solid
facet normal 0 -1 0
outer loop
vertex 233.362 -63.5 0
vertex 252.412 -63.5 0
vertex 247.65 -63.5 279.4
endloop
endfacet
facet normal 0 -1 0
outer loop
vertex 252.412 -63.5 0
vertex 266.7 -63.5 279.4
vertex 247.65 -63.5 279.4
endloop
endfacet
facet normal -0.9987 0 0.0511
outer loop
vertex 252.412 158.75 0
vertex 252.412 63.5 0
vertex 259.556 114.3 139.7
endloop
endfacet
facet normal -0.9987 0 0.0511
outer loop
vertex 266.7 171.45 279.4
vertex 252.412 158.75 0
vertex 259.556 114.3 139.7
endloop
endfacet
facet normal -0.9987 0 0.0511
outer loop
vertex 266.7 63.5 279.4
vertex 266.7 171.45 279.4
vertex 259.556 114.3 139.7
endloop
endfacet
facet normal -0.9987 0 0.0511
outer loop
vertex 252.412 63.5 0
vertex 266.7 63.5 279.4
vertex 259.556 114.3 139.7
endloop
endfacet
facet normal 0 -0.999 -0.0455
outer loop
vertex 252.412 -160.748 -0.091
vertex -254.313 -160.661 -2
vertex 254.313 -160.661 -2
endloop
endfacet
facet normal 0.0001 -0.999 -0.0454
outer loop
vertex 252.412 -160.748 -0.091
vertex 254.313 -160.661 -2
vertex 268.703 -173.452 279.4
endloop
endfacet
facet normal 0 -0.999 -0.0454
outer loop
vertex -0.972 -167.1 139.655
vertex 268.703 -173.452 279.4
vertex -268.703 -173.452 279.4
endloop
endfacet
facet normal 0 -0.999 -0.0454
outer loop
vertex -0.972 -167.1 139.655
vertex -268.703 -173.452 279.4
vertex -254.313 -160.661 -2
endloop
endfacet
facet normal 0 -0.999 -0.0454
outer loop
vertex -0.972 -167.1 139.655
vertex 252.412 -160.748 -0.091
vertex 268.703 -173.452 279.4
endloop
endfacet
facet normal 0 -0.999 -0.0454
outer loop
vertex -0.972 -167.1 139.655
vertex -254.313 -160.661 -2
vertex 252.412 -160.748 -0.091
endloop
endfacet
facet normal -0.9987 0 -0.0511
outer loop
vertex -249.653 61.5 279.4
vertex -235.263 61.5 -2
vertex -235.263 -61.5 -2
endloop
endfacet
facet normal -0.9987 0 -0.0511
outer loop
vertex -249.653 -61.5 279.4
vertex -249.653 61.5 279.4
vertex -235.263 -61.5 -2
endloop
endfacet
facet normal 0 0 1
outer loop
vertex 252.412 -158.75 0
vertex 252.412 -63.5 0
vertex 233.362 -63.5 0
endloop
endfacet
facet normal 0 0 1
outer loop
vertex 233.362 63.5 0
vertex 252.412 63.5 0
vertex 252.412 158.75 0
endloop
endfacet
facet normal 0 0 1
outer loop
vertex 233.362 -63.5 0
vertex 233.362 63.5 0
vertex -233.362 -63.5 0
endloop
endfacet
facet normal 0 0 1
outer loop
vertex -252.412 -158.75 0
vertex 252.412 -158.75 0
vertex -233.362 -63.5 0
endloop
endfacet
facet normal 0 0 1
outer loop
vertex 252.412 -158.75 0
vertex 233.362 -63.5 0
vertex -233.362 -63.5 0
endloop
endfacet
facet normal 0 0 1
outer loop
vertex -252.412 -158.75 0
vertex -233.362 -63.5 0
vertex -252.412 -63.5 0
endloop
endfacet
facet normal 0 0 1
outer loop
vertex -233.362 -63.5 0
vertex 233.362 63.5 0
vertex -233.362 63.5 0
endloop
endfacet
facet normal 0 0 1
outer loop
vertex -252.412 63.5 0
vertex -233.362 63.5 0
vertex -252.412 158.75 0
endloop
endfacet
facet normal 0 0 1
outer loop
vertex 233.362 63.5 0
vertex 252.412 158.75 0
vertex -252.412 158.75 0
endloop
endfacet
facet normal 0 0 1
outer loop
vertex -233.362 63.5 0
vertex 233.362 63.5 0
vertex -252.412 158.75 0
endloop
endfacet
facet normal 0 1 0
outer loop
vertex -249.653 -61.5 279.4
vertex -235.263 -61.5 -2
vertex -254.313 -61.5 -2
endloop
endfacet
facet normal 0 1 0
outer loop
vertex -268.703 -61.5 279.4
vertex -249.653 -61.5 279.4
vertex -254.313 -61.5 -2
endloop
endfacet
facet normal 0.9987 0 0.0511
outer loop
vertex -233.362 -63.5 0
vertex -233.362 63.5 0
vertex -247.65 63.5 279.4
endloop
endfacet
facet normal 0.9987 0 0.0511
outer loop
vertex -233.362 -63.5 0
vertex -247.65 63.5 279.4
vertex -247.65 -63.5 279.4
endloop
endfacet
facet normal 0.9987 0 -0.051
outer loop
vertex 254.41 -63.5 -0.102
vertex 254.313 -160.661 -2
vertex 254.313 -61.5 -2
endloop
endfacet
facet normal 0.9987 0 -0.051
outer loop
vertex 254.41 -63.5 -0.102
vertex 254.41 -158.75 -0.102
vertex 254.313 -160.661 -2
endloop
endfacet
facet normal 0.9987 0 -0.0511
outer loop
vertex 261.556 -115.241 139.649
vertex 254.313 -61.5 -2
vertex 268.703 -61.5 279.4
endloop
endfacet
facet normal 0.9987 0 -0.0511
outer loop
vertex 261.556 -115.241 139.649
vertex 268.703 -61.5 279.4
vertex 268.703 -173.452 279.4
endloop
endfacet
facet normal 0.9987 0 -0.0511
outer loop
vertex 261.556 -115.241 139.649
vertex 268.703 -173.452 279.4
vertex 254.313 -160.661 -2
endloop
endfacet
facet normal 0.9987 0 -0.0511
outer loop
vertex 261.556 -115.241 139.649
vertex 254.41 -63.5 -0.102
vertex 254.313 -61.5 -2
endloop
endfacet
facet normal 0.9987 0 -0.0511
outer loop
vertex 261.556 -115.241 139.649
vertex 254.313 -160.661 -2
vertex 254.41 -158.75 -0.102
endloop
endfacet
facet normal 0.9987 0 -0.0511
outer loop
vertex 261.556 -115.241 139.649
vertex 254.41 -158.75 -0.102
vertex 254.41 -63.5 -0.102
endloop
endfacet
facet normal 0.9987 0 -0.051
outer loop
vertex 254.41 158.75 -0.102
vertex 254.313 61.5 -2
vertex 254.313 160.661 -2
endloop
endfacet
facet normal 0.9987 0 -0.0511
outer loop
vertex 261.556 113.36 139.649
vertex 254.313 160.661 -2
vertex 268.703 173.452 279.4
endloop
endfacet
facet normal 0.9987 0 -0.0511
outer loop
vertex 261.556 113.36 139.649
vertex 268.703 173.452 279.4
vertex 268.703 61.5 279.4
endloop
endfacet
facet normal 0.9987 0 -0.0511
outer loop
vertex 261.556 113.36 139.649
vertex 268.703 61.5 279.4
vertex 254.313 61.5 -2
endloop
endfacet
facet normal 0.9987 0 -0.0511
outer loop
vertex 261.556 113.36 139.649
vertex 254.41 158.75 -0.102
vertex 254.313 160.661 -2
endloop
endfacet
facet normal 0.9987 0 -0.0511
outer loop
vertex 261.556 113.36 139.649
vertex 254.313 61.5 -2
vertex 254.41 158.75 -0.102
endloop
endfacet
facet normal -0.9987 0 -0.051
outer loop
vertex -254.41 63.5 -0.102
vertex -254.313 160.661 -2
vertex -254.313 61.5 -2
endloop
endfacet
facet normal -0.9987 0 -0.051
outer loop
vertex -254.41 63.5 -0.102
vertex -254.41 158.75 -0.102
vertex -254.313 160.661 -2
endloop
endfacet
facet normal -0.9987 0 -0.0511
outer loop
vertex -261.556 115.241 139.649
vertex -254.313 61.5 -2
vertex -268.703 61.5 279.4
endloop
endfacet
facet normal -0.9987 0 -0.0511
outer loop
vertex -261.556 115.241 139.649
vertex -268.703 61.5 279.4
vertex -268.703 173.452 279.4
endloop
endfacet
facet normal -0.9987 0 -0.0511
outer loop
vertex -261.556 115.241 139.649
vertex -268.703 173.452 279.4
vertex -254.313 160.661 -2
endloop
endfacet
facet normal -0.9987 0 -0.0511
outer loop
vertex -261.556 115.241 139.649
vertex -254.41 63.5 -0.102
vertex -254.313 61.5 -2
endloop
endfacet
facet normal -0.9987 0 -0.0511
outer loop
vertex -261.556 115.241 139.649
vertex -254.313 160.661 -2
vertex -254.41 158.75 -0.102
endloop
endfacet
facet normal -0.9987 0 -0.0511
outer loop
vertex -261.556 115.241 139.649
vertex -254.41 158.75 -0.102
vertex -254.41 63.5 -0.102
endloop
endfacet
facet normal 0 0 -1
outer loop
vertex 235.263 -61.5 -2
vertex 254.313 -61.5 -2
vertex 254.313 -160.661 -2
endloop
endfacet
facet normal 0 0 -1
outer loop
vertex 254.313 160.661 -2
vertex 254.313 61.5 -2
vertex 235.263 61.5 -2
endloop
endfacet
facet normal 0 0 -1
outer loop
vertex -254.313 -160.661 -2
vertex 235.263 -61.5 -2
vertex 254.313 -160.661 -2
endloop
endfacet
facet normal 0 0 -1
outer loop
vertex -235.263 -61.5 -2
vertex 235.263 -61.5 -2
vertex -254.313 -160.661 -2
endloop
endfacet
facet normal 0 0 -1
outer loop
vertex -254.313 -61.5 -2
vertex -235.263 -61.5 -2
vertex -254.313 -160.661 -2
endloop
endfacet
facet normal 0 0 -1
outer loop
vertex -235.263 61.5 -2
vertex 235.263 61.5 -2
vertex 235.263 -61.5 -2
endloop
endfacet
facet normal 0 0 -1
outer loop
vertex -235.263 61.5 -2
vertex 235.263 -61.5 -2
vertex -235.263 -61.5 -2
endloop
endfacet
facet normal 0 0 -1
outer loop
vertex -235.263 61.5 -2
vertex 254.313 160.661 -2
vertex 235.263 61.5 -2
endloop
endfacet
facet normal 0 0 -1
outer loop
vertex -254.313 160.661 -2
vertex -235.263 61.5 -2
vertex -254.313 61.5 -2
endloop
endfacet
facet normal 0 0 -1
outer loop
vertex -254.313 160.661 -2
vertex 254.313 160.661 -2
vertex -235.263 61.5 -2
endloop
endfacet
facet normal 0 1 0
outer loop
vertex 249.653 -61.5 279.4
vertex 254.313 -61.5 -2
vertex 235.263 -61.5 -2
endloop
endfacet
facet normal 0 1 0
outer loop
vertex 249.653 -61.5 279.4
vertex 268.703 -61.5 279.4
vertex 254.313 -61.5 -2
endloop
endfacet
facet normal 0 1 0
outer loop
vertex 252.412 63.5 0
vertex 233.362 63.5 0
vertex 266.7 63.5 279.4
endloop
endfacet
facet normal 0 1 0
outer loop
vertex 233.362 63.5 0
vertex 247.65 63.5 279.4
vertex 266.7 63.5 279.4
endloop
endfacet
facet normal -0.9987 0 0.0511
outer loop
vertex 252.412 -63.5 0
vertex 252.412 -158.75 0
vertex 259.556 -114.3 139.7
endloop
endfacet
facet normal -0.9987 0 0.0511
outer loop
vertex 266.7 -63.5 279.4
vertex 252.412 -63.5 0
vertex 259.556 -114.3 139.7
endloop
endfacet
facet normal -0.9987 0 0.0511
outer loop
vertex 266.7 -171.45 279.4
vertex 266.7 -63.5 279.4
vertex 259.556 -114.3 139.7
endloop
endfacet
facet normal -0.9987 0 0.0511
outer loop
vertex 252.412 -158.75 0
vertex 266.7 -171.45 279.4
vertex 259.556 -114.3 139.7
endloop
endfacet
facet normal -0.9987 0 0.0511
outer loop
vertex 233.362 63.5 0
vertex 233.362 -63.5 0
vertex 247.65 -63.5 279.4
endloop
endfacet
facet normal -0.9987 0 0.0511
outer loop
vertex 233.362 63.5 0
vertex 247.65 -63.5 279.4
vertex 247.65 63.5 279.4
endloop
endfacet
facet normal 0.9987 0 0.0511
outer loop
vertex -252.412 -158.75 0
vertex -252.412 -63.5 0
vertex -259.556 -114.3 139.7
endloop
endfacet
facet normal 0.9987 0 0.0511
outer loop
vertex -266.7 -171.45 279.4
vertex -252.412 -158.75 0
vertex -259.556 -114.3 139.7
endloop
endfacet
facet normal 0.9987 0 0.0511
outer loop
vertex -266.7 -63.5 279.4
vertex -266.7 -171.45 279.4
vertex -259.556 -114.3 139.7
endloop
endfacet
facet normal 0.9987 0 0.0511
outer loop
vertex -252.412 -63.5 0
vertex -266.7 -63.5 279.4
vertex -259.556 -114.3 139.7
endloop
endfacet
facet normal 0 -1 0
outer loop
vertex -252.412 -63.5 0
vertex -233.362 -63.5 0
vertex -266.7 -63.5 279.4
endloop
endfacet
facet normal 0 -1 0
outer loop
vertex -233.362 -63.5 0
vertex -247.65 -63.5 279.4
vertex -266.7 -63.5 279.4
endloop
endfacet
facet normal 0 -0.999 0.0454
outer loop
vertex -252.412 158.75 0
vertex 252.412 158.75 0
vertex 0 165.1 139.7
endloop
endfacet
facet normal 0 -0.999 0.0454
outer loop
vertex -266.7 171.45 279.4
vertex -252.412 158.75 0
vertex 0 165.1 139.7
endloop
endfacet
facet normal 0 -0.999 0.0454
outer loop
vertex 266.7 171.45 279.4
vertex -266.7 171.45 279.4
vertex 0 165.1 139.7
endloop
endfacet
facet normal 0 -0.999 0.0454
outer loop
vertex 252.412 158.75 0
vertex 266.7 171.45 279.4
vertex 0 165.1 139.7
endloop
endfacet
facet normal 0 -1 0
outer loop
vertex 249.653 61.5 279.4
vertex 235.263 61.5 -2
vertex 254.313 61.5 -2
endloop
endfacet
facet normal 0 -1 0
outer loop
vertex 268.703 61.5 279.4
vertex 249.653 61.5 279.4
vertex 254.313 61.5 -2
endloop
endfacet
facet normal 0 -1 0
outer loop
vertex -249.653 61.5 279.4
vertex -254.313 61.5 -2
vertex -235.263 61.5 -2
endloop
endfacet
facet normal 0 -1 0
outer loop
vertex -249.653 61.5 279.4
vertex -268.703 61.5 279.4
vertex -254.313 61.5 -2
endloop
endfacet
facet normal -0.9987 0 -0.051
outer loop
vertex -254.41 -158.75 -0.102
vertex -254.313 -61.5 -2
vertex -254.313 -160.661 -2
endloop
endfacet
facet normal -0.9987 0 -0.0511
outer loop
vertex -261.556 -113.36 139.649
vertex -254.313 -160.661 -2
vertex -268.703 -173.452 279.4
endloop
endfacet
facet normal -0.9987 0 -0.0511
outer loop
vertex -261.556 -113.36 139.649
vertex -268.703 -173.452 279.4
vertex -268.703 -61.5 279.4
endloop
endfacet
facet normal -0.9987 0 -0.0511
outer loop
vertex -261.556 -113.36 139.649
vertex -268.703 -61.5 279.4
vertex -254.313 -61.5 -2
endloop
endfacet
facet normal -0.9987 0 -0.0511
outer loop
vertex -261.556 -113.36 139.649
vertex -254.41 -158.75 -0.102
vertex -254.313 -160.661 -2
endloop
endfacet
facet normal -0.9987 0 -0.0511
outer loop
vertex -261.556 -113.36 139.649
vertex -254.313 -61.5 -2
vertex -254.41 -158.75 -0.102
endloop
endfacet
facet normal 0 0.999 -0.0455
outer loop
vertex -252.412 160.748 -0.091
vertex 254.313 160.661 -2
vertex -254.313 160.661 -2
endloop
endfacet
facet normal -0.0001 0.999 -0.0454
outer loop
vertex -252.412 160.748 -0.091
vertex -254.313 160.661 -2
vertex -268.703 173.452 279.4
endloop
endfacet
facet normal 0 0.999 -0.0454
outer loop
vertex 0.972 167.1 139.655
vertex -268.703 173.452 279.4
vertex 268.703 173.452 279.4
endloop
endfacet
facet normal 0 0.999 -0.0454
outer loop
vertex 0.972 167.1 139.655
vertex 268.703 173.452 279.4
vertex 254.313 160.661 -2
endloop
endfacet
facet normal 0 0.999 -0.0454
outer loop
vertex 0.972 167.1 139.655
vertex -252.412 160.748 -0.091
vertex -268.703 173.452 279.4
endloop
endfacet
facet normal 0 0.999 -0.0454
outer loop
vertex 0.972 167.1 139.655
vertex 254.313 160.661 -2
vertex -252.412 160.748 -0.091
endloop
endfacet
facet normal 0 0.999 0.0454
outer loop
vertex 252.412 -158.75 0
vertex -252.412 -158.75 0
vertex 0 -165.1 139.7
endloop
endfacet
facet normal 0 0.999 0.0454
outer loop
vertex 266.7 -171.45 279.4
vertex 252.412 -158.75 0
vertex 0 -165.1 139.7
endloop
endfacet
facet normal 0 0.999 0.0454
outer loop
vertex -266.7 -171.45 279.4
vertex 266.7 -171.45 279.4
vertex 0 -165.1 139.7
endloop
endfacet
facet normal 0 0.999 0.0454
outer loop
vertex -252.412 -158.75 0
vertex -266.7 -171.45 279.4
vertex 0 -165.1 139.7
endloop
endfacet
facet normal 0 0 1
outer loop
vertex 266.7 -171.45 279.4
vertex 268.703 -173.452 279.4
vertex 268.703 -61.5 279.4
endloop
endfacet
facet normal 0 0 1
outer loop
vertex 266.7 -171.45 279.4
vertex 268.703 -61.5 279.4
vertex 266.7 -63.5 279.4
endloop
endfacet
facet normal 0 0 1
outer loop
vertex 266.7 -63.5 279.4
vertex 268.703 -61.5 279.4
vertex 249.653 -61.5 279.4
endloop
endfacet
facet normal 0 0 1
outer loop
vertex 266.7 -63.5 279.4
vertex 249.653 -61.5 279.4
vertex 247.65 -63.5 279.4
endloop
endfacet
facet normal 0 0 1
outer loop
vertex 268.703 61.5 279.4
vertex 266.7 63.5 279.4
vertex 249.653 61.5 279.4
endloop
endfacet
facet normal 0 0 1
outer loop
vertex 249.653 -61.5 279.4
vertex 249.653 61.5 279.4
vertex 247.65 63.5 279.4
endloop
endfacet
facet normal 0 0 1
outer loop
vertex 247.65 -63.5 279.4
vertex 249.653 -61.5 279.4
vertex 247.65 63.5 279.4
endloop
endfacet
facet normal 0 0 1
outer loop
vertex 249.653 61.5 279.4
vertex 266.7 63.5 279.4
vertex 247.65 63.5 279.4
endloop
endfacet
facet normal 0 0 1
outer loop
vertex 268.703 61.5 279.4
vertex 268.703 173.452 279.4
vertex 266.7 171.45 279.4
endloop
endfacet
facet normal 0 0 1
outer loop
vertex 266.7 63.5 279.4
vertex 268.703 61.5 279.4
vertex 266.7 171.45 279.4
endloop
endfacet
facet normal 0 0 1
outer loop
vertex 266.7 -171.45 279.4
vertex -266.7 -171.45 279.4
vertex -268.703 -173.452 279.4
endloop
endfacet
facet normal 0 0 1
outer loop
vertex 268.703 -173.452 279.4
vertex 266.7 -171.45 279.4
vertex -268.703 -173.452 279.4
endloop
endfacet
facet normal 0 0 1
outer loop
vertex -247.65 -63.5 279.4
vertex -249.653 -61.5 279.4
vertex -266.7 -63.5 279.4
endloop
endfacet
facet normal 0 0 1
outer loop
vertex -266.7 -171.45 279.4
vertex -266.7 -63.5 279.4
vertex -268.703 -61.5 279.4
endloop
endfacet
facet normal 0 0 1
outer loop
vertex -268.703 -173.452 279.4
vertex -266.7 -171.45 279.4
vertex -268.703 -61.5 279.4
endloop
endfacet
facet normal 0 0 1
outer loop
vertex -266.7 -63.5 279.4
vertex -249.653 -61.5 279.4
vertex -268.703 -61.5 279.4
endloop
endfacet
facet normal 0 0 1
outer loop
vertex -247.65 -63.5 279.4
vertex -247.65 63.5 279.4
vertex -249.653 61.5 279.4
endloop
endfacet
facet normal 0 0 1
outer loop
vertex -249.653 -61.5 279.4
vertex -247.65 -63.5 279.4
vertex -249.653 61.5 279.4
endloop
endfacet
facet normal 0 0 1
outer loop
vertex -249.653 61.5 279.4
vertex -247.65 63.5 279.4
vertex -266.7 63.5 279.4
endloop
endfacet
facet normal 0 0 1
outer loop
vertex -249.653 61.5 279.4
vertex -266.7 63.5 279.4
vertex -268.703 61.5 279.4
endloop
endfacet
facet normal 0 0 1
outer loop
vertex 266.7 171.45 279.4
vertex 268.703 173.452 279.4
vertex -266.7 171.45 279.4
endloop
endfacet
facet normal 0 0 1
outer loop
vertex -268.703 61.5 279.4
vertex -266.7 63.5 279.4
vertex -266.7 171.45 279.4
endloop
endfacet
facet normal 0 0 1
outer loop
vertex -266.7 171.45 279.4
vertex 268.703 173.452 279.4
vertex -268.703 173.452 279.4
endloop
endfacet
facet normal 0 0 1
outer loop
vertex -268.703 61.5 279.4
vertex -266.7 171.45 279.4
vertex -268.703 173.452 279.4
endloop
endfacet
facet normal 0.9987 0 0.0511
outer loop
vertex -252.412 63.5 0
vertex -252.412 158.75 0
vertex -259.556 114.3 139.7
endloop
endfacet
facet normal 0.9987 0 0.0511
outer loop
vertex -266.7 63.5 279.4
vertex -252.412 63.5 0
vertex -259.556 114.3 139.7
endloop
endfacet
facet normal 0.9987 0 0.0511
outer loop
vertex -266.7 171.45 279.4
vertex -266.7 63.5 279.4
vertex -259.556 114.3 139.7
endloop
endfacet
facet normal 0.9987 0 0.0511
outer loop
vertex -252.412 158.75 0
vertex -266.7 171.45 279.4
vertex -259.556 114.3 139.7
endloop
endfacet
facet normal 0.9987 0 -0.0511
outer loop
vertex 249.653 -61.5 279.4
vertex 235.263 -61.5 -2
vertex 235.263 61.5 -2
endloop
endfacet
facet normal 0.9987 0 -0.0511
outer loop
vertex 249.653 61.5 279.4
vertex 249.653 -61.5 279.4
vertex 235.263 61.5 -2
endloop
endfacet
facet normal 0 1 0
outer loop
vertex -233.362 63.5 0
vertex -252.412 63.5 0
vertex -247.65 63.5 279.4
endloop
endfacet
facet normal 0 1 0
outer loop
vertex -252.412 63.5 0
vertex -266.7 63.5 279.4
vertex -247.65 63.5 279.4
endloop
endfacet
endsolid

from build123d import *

# Parameters (mm, degrees)
F4_T = 2


with BuildPart() as f3:
    # F0 (on Top) → F3 section 0
    with BuildSketch(Plane.XY):
        Polygon((252.4125, 158.75), (-252.4125, 158.75), (-252.4125, 63.5), (-233.3625, 63.5), (-233.3625, -63.5), (-252.4125, -63.5), (-252.4125, -158.75), (252.4125, -158.75), (252.4125, -63.5), (233.3625, -63.5), (233.3625, 63.5), (252.4125, 63.5), align=None)
    # F2 (on offset) → F3 section 1
    with BuildSketch(Plane.XY.offset(279.4)):
        Polygon((266.7, 171.45), (-266.7, 171.45), (-266.7, 63.5), (-247.65, 63.5), (-247.65, -63.5), (-266.7, -63.5), (-266.7, -171.45), (266.7, -171.45), (266.7, -63.5), (247.65, -63.5), (247.65, 63.5), (266.7, 63.5), align=None)
    loft()

    # F4
    f4_openings = [f3.faces().sort_by_distance(p)[0] for p in [
        (0, 0, 279.4),
    ]]
    offset(amount=F4_T, openings=f4_openings, kind=Kind.INTERSECTION)


solid = f3.part
